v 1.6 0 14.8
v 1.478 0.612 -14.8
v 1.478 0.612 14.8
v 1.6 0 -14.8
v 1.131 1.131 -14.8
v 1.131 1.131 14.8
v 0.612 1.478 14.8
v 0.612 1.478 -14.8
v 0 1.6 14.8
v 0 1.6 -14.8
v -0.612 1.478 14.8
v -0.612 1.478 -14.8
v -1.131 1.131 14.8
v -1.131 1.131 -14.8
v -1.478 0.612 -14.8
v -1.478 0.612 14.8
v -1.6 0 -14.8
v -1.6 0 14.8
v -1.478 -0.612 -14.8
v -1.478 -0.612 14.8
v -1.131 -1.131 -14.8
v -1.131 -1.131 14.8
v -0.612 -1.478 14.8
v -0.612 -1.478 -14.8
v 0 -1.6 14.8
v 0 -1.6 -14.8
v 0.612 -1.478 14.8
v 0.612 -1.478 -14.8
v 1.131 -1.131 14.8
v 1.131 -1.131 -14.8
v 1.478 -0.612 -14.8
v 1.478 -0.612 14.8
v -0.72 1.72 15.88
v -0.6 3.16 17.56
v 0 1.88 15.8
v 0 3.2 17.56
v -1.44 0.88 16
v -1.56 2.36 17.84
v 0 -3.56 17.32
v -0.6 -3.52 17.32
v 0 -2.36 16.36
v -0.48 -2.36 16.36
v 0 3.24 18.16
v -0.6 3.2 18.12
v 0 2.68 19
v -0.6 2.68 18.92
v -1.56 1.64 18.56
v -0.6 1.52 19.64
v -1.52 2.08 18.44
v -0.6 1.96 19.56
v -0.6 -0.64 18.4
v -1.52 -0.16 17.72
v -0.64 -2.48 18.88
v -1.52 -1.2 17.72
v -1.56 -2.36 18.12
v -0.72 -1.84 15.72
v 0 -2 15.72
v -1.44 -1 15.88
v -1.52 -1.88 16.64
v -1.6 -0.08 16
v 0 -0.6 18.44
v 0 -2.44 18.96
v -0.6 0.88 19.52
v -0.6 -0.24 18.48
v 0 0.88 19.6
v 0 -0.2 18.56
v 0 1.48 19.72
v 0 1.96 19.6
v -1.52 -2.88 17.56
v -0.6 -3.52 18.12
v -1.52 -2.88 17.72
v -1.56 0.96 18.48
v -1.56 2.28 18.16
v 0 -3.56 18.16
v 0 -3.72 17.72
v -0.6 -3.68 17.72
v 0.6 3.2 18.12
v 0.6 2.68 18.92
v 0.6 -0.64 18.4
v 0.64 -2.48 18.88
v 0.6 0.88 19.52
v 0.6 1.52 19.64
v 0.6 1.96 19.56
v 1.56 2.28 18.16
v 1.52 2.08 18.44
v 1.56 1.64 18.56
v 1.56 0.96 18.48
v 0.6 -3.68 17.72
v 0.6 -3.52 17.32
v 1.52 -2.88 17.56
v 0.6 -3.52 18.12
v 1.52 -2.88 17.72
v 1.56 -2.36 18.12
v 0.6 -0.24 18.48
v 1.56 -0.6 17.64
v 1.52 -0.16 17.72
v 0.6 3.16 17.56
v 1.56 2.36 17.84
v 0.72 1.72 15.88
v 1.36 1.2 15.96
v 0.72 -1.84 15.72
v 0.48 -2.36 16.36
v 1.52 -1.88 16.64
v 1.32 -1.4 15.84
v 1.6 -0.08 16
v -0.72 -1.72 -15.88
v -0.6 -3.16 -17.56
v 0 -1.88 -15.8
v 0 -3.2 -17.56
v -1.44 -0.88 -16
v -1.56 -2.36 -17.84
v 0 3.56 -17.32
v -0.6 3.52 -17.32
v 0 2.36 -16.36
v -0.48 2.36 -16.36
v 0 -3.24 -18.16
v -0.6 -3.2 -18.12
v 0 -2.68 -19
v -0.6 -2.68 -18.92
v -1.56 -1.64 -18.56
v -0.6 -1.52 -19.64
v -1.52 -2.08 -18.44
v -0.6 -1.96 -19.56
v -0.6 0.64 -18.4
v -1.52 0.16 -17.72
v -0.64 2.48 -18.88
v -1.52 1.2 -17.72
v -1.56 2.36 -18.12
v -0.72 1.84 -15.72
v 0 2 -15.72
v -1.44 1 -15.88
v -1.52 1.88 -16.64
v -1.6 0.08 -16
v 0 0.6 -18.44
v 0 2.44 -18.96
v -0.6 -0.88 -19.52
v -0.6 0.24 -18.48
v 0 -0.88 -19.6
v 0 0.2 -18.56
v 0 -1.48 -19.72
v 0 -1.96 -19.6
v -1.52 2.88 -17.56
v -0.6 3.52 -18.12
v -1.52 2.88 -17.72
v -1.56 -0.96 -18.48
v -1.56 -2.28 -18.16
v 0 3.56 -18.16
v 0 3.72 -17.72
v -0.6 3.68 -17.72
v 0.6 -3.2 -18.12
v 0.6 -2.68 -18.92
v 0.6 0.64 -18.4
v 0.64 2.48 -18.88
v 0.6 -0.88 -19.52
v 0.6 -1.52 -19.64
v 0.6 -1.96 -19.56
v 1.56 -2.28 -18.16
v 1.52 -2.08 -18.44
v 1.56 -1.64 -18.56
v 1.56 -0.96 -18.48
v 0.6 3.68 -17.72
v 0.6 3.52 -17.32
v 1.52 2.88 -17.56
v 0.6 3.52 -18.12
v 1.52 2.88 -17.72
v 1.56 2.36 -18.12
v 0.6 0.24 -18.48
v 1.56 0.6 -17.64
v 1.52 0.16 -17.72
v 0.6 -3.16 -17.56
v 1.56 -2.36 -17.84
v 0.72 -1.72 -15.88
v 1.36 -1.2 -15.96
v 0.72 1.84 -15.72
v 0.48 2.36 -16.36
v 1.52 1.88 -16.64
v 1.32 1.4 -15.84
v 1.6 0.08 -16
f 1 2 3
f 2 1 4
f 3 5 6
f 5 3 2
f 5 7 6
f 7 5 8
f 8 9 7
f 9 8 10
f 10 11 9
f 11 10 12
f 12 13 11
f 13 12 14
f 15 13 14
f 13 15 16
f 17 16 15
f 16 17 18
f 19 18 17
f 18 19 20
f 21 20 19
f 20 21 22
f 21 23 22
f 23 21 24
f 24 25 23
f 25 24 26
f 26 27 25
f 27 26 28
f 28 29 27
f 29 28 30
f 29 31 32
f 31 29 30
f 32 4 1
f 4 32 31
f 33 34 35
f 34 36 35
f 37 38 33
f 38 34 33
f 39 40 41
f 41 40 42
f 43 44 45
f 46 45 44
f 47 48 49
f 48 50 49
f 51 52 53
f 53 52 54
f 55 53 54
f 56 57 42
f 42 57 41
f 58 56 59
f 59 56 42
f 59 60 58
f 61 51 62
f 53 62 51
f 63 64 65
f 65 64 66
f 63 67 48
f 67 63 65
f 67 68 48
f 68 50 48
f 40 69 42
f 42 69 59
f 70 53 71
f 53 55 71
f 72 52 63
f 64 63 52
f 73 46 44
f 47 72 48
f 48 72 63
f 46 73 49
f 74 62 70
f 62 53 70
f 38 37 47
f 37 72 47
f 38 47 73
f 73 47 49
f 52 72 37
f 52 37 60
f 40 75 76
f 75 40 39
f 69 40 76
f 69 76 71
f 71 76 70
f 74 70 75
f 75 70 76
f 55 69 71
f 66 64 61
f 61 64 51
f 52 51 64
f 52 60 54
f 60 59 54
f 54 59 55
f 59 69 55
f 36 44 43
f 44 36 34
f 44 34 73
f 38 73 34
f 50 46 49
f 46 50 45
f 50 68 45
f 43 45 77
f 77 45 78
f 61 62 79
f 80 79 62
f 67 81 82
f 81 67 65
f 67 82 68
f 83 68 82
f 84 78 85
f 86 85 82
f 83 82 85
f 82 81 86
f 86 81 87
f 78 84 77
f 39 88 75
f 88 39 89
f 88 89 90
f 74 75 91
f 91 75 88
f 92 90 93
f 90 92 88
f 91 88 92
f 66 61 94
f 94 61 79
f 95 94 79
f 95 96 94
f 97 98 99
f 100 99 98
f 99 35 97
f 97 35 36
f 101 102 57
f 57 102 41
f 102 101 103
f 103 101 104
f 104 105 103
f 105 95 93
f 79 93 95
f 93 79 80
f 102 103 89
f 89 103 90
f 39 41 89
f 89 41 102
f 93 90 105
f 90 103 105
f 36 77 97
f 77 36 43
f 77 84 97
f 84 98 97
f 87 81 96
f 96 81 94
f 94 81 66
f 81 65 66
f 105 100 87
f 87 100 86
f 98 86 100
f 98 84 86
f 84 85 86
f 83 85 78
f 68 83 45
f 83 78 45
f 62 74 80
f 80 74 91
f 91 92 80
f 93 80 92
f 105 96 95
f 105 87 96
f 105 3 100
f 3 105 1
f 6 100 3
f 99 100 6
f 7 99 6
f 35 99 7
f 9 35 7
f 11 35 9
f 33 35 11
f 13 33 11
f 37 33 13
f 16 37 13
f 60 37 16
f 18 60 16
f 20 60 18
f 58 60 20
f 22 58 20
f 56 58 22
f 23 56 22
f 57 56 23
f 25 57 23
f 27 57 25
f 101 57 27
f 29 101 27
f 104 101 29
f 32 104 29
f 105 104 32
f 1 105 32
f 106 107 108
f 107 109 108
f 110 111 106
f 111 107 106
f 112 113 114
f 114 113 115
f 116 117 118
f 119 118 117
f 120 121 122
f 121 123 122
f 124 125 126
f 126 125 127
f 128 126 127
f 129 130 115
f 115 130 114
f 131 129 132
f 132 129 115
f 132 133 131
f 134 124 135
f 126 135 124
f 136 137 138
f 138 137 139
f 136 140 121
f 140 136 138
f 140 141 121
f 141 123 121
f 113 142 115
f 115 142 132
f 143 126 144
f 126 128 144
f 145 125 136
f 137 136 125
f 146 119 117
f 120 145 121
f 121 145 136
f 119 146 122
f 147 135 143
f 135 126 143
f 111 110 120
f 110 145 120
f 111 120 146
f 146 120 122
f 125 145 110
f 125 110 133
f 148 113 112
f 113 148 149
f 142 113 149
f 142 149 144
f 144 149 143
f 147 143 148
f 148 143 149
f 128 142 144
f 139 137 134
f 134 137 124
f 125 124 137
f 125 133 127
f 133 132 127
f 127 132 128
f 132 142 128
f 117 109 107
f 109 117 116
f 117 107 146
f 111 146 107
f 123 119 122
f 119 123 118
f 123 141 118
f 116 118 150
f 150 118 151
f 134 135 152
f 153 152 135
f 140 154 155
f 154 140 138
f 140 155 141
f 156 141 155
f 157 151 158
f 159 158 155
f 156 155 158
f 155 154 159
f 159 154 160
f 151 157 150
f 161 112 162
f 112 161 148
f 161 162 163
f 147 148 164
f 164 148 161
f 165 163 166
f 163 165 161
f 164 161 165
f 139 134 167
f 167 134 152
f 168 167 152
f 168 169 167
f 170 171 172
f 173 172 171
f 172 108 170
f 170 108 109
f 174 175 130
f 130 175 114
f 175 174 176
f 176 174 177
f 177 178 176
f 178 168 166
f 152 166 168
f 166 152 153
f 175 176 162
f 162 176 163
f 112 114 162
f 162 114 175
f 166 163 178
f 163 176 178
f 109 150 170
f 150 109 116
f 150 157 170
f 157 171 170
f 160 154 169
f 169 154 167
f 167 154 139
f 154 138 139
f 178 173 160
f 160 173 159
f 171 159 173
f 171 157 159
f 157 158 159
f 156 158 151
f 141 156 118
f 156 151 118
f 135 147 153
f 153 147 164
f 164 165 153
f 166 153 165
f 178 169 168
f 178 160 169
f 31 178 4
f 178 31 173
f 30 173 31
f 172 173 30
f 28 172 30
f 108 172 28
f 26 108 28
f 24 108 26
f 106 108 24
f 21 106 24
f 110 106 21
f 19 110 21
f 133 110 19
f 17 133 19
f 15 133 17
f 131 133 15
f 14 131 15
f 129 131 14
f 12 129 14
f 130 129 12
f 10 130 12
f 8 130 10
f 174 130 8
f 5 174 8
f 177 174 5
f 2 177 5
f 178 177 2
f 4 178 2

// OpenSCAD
// file: ../p/4-4cyli.scad
use <../lib.scad>
function ldraw_lib__4_4cyli() = [
// 0 Cylinder 1.0
// 0 Name: 4-4cyli.dat
// 0 Author: James Jessiman
// 0 !LDRAW_ORG Primitive UPDATE 2005-01
// 0 !LICENSE Licensed under CC BY 2.0 and CC BY 4.0 : see CAreadme.txt
// 
// 0 BFC CERTIFY CCW
  [0,"BFC","CERTIFY"],
  [0,"BFC","CCW"],
// 
// 0 !HISTORY 1998-12-15 [PTadmin] Official Update 1998-10
// 0 !HISTORY 2002-03-23 [sbliss] Added BFC statement; merged headers from files in distributions LDraw 0.27 and Complete.
// 0 !HISTORY 2002-04-25 [PTadmin] Official Update 2002-02
// 0 !HISTORY 2004-12-14 [guyvivan] BFC CCW
// 0 !HISTORY 2005-12-28 [PTadmin] Official Update 2005-01
// 0 !HISTORY 2007-06-24 [PTadmin] Header formatted for Contributor Agreement
// 0 !HISTORY 2008-07-01 [PTadmin] Official Update 2008-01
// 
// 
// 4 16 1 1 0 0.9239 1 0.3827 0.9239 0 0.3827 1 0 0
  [4,16,1,1,0,0.9239,1,0.3827,0.9239,0,0.3827,1,0,0],
// 5 24 1 0 0 1 1 0 0.9239 0 0.3827 0.9239 0 -0.3827
  [5,24,1,0,0,1,1,0,0.9239,0,0.3827,0.9239,0,-0.3827],
// 4 16 0.9239 1 0.3827 0.7071 1 0.7071 0.7071 0 0.7071 0.9239 0 0.3827
  [4,16,0.9239,1,0.3827,0.7071,1,0.7071,0.7071,0,0.7071,0.9239,0,0.3827],
// 5 24 0.9239 0 0.3827 0.9239 1 0.3827 0.7071 0 0.7071 1 0 0
  [5,24,0.9239,0,0.3827,0.9239,1,0.3827,0.7071,0,0.7071,1,0,0],
// 4 16 0.7071 1 0.7071 0.3827 1 0.9239 0.3827 0 0.9239 0.7071 0 0.7071
  [4,16,0.7071,1,0.7071,0.3827,1,0.9239,0.3827,0,0.9239,0.7071,0,0.7071],
// 5 24 0.7071 0 0.7071 0.7071 1 0.7071 0.3827 0 0.9239 0.9239 0 0.3827
  [5,24,0.7071,0,0.7071,0.7071,1,0.7071,0.3827,0,0.9239,0.9239,0,0.3827],
// 4 16 0.3827 1 0.9239 0 1 1 0 0 1 0.3827 0 0.9239
  [4,16,0.3827,1,0.9239,0,1,1,0,0,1,0.3827,0,0.9239],
// 5 24 0.3827 0 0.9239 0.3827 1 0.9239 0 0 1 0.7071 0 0.7071
  [5,24,0.3827,0,0.9239,0.3827,1,0.9239,0,0,1,0.7071,0,0.7071],
// 4 16 0 1 1 -0.3827 1 0.9239 -0.3827 0 0.9239 0 0 1
  [4,16,0,1,1,-0.3827,1,0.9239,-0.3827,0,0.9239,0,0,1],
// 5 24 0 0 1 0 1 1 -0.3827 0 0.9239 0.3827 0 0.9239
  [5,24,0,0,1,0,1,1,-0.3827,0,0.9239,0.3827,0,0.9239],
// 4 16 -0.3827 1 0.9239 -0.7071 1 0.7071 -0.7071 0 0.7071 -0.3827 0 0.9239
  [4,16,-0.3827,1,0.9239,-0.7071,1,0.7071,-0.7071,0,0.7071,-0.3827,0,0.9239],
// 5 24 -0.3827 0 0.9239 -0.3827 1 0.9239 -0.7071 0 0.7071 0 0 1
  [5,24,-0.3827,0,0.9239,-0.3827,1,0.9239,-0.7071,0,0.7071,0,0,1],
// 4 16 -0.7071 1 0.7071 -0.9239 1 0.3827 -0.9239 0 0.3827 -0.7071 0 0.7071
  [4,16,-0.7071,1,0.7071,-0.9239,1,0.3827,-0.9239,0,0.3827,-0.7071,0,0.7071],
// 5 24 -0.7071 0 0.7071 -0.7071 1 0.7071 -0.9239 0 0.3827 -0.3827 0 0.9239
  [5,24,-0.7071,0,0.7071,-0.7071,1,0.7071,-0.9239,0,0.3827,-0.3827,0,0.9239],
// 4 16 -0.9239 1 0.3827 -1 1 0 -1 0 0 -0.9239 0 0.3827
  [4,16,-0.9239,1,0.3827,-1,1,0,-1,0,0,-0.9239,0,0.3827],
// 5 24 -0.9239 0 0.3827 -0.9239 1 0.3827 -1 0 0 -0.7071 0 0.7071
  [5,24,-0.9239,0,0.3827,-0.9239,1,0.3827,-1,0,0,-0.7071,0,0.7071],
// 4 16 -1 1 0 -0.9239 1 -0.3827 -0.9239 0 -0.3827 -1 0 0
  [4,16,-1,1,0,-0.9239,1,-0.3827,-0.9239,0,-0.3827,-1,0,0],
// 5 24 -1 0 0 -1 1 0 -0.9239 0 -0.3827 -0.9239 0 0.3827
  [5,24,-1,0,0,-1,1,0,-0.9239,0,-0.3827,-0.9239,0,0.3827],
// 4 16 -0.9239 1 -0.3827 -0.7071 1 -0.7071 -0.7071 0 -0.7071 -0.9239 0 -0.3827
  [4,16,-0.9239,1,-0.3827,-0.7071,1,-0.7071,-0.7071,0,-0.7071,-0.9239,0,-0.3827],
// 5 24 -0.9239 0 -0.3827 -0.9239 1 -0.3827 -0.7071 0 -0.7071 -1 0 0
  [5,24,-0.9239,0,-0.3827,-0.9239,1,-0.3827,-0.7071,0,-0.7071,-1,0,0],
// 4 16 -0.7071 1 -0.7071 -0.3827 1 -0.9239 -0.3827 0 -0.9239 -0.7071 0 -0.7071
  [4,16,-0.7071,1,-0.7071,-0.3827,1,-0.9239,-0.3827,0,-0.9239,-0.7071,0,-0.7071],
// 5 24 -0.7071 0 -0.7071 -0.7071 1 -0.7071 -0.3827 0 -0.9239 -0.9239 0 -0.3827
  [5,24,-0.7071,0,-0.7071,-0.7071,1,-0.7071,-0.3827,0,-0.9239,-0.9239,0,-0.3827],
// 4 16 -0.3827 1 -0.9239 0 1 -1 0 0 -1 -0.3827 0 -0.9239
  [4,16,-0.3827,1,-0.9239,0,1,-1,0,0,-1,-0.3827,0,-0.9239],
// 5 24 -0.3827 0 -0.9239 -0.3827 1 -0.9239 0 0 -1 -0.7071 0 -0.7071
  [5,24,-0.3827,0,-0.9239,-0.3827,1,-0.9239,0,0,-1,-0.7071,0,-0.7071],
// 4 16 0 1 -1 0.3827 1 -0.9239 0.3827 0 -0.9239 0 0 -1
  [4,16,0,1,-1,0.3827,1,-0.9239,0.3827,0,-0.9239,0,0,-1],
// 5 24 0 0 -1 0 1 -1 0.3827 0 -0.9239 -0.3827 0 -0.9239
  [5,24,0,0,-1,0,1,-1,0.3827,0,-0.9239,-0.3827,0,-0.9239],
// 4 16 0.3827 1 -0.9239 0.7071 1 -0.7071 0.7071 0 -0.7071 0.3827 0 -0.9239
  [4,16,0.3827,1,-0.9239,0.7071,1,-0.7071,0.7071,0,-0.7071,0.3827,0,-0.9239],
// 5 24 0.3827 0 -0.9239 0.3827 1 -0.9239 0.7071 0 -0.7071 0 0 -1
  [5,24,0.3827,0,-0.9239,0.3827,1,-0.9239,0.7071,0,-0.7071,0,0,-1],
// 4 16 0.7071 1 -0.7071 0.9239 1 -0.3827 0.9239 0 -0.3827 0.7071 0 -0.7071
  [4,16,0.7071,1,-0.7071,0.9239,1,-0.3827,0.9239,0,-0.3827,0.7071,0,-0.7071],
// 5 24 0.7071 0 -0.7071 0.7071 1 -0.7071 0.9239 0 -0.3827 0.3827 0 -0.9239
  [5,24,0.7071,0,-0.7071,0.7071,1,-0.7071,0.9239,0,-0.3827,0.3827,0,-0.9239],
// 4 16 0.9239 1 -0.3827 1 1 0 1 0 0 0.9239 0 -0.3827
  [4,16,0.9239,1,-0.3827,1,1,0,1,0,0,0.9239,0,-0.3827],
// 5 24 0.9239 0 -0.3827 0.9239 1 -0.3827 1 0 0 0.7071 0 -0.7071
  [5,24,0.9239,0,-0.3827,0.9239,1,-0.3827,1,0,0,0.7071,0,-0.7071],
// 0
];
makepoly(ldraw_lib__4_4cyli(), line=0.2);
// main file
use <../lib.scad>
use <../p/4-4cyli.scad>
use <s/92691s01.scad>
function ldraw_lib__92691() = [
// 0 Bone 5L
// 0 Name: 92691.dat
// 0 Author: Philippe Hurbain [Philo]
// 0 !LDRAW_ORG Part UPDATE 2011-01
// 0 !LICENSE Licensed under CC BY 2.0 and CC BY 4.0 : see CAreadme.txt
// 
// 0 BFC CERTIFY CCW
  [0,"BFC","CERTIFY"],
  [0,"BFC","CCW"],
// 
// 0 !CATEGORY Minifig Accessory
// 0 !KEYWORDS Dog Bone, Skeleton
// 
// 0 !HISTORY 2011-07-25 [PTadmin] Official Update 2011-01
// 
// 
// 1 16 0 -37 0 4 0 0 0 74 0 0 0 4 4-4cyli.dat
  [1,16,0,-37,0,4,0,0,0,74,0,0,0,4, ldraw_lib__4_4cyli()],
// 1 16 0 -37 0 1 0 0 0 1 0 0 0 1 s\92691s01.dat
  [1,16,0,-37,0,1,0,0,0,1,0,0,0,1, ldraw_lib__s__92691s01()],
// 1 16 0 37 0 1 0 0 0 -1 0 0 0 -1 s\92691s01.dat
  [1,16,0,37,0,1,0,0,0,-1,0,0,0,-1, ldraw_lib__s__92691s01()],
];
makepoly(ldraw_lib__92691(), line=0.2);
